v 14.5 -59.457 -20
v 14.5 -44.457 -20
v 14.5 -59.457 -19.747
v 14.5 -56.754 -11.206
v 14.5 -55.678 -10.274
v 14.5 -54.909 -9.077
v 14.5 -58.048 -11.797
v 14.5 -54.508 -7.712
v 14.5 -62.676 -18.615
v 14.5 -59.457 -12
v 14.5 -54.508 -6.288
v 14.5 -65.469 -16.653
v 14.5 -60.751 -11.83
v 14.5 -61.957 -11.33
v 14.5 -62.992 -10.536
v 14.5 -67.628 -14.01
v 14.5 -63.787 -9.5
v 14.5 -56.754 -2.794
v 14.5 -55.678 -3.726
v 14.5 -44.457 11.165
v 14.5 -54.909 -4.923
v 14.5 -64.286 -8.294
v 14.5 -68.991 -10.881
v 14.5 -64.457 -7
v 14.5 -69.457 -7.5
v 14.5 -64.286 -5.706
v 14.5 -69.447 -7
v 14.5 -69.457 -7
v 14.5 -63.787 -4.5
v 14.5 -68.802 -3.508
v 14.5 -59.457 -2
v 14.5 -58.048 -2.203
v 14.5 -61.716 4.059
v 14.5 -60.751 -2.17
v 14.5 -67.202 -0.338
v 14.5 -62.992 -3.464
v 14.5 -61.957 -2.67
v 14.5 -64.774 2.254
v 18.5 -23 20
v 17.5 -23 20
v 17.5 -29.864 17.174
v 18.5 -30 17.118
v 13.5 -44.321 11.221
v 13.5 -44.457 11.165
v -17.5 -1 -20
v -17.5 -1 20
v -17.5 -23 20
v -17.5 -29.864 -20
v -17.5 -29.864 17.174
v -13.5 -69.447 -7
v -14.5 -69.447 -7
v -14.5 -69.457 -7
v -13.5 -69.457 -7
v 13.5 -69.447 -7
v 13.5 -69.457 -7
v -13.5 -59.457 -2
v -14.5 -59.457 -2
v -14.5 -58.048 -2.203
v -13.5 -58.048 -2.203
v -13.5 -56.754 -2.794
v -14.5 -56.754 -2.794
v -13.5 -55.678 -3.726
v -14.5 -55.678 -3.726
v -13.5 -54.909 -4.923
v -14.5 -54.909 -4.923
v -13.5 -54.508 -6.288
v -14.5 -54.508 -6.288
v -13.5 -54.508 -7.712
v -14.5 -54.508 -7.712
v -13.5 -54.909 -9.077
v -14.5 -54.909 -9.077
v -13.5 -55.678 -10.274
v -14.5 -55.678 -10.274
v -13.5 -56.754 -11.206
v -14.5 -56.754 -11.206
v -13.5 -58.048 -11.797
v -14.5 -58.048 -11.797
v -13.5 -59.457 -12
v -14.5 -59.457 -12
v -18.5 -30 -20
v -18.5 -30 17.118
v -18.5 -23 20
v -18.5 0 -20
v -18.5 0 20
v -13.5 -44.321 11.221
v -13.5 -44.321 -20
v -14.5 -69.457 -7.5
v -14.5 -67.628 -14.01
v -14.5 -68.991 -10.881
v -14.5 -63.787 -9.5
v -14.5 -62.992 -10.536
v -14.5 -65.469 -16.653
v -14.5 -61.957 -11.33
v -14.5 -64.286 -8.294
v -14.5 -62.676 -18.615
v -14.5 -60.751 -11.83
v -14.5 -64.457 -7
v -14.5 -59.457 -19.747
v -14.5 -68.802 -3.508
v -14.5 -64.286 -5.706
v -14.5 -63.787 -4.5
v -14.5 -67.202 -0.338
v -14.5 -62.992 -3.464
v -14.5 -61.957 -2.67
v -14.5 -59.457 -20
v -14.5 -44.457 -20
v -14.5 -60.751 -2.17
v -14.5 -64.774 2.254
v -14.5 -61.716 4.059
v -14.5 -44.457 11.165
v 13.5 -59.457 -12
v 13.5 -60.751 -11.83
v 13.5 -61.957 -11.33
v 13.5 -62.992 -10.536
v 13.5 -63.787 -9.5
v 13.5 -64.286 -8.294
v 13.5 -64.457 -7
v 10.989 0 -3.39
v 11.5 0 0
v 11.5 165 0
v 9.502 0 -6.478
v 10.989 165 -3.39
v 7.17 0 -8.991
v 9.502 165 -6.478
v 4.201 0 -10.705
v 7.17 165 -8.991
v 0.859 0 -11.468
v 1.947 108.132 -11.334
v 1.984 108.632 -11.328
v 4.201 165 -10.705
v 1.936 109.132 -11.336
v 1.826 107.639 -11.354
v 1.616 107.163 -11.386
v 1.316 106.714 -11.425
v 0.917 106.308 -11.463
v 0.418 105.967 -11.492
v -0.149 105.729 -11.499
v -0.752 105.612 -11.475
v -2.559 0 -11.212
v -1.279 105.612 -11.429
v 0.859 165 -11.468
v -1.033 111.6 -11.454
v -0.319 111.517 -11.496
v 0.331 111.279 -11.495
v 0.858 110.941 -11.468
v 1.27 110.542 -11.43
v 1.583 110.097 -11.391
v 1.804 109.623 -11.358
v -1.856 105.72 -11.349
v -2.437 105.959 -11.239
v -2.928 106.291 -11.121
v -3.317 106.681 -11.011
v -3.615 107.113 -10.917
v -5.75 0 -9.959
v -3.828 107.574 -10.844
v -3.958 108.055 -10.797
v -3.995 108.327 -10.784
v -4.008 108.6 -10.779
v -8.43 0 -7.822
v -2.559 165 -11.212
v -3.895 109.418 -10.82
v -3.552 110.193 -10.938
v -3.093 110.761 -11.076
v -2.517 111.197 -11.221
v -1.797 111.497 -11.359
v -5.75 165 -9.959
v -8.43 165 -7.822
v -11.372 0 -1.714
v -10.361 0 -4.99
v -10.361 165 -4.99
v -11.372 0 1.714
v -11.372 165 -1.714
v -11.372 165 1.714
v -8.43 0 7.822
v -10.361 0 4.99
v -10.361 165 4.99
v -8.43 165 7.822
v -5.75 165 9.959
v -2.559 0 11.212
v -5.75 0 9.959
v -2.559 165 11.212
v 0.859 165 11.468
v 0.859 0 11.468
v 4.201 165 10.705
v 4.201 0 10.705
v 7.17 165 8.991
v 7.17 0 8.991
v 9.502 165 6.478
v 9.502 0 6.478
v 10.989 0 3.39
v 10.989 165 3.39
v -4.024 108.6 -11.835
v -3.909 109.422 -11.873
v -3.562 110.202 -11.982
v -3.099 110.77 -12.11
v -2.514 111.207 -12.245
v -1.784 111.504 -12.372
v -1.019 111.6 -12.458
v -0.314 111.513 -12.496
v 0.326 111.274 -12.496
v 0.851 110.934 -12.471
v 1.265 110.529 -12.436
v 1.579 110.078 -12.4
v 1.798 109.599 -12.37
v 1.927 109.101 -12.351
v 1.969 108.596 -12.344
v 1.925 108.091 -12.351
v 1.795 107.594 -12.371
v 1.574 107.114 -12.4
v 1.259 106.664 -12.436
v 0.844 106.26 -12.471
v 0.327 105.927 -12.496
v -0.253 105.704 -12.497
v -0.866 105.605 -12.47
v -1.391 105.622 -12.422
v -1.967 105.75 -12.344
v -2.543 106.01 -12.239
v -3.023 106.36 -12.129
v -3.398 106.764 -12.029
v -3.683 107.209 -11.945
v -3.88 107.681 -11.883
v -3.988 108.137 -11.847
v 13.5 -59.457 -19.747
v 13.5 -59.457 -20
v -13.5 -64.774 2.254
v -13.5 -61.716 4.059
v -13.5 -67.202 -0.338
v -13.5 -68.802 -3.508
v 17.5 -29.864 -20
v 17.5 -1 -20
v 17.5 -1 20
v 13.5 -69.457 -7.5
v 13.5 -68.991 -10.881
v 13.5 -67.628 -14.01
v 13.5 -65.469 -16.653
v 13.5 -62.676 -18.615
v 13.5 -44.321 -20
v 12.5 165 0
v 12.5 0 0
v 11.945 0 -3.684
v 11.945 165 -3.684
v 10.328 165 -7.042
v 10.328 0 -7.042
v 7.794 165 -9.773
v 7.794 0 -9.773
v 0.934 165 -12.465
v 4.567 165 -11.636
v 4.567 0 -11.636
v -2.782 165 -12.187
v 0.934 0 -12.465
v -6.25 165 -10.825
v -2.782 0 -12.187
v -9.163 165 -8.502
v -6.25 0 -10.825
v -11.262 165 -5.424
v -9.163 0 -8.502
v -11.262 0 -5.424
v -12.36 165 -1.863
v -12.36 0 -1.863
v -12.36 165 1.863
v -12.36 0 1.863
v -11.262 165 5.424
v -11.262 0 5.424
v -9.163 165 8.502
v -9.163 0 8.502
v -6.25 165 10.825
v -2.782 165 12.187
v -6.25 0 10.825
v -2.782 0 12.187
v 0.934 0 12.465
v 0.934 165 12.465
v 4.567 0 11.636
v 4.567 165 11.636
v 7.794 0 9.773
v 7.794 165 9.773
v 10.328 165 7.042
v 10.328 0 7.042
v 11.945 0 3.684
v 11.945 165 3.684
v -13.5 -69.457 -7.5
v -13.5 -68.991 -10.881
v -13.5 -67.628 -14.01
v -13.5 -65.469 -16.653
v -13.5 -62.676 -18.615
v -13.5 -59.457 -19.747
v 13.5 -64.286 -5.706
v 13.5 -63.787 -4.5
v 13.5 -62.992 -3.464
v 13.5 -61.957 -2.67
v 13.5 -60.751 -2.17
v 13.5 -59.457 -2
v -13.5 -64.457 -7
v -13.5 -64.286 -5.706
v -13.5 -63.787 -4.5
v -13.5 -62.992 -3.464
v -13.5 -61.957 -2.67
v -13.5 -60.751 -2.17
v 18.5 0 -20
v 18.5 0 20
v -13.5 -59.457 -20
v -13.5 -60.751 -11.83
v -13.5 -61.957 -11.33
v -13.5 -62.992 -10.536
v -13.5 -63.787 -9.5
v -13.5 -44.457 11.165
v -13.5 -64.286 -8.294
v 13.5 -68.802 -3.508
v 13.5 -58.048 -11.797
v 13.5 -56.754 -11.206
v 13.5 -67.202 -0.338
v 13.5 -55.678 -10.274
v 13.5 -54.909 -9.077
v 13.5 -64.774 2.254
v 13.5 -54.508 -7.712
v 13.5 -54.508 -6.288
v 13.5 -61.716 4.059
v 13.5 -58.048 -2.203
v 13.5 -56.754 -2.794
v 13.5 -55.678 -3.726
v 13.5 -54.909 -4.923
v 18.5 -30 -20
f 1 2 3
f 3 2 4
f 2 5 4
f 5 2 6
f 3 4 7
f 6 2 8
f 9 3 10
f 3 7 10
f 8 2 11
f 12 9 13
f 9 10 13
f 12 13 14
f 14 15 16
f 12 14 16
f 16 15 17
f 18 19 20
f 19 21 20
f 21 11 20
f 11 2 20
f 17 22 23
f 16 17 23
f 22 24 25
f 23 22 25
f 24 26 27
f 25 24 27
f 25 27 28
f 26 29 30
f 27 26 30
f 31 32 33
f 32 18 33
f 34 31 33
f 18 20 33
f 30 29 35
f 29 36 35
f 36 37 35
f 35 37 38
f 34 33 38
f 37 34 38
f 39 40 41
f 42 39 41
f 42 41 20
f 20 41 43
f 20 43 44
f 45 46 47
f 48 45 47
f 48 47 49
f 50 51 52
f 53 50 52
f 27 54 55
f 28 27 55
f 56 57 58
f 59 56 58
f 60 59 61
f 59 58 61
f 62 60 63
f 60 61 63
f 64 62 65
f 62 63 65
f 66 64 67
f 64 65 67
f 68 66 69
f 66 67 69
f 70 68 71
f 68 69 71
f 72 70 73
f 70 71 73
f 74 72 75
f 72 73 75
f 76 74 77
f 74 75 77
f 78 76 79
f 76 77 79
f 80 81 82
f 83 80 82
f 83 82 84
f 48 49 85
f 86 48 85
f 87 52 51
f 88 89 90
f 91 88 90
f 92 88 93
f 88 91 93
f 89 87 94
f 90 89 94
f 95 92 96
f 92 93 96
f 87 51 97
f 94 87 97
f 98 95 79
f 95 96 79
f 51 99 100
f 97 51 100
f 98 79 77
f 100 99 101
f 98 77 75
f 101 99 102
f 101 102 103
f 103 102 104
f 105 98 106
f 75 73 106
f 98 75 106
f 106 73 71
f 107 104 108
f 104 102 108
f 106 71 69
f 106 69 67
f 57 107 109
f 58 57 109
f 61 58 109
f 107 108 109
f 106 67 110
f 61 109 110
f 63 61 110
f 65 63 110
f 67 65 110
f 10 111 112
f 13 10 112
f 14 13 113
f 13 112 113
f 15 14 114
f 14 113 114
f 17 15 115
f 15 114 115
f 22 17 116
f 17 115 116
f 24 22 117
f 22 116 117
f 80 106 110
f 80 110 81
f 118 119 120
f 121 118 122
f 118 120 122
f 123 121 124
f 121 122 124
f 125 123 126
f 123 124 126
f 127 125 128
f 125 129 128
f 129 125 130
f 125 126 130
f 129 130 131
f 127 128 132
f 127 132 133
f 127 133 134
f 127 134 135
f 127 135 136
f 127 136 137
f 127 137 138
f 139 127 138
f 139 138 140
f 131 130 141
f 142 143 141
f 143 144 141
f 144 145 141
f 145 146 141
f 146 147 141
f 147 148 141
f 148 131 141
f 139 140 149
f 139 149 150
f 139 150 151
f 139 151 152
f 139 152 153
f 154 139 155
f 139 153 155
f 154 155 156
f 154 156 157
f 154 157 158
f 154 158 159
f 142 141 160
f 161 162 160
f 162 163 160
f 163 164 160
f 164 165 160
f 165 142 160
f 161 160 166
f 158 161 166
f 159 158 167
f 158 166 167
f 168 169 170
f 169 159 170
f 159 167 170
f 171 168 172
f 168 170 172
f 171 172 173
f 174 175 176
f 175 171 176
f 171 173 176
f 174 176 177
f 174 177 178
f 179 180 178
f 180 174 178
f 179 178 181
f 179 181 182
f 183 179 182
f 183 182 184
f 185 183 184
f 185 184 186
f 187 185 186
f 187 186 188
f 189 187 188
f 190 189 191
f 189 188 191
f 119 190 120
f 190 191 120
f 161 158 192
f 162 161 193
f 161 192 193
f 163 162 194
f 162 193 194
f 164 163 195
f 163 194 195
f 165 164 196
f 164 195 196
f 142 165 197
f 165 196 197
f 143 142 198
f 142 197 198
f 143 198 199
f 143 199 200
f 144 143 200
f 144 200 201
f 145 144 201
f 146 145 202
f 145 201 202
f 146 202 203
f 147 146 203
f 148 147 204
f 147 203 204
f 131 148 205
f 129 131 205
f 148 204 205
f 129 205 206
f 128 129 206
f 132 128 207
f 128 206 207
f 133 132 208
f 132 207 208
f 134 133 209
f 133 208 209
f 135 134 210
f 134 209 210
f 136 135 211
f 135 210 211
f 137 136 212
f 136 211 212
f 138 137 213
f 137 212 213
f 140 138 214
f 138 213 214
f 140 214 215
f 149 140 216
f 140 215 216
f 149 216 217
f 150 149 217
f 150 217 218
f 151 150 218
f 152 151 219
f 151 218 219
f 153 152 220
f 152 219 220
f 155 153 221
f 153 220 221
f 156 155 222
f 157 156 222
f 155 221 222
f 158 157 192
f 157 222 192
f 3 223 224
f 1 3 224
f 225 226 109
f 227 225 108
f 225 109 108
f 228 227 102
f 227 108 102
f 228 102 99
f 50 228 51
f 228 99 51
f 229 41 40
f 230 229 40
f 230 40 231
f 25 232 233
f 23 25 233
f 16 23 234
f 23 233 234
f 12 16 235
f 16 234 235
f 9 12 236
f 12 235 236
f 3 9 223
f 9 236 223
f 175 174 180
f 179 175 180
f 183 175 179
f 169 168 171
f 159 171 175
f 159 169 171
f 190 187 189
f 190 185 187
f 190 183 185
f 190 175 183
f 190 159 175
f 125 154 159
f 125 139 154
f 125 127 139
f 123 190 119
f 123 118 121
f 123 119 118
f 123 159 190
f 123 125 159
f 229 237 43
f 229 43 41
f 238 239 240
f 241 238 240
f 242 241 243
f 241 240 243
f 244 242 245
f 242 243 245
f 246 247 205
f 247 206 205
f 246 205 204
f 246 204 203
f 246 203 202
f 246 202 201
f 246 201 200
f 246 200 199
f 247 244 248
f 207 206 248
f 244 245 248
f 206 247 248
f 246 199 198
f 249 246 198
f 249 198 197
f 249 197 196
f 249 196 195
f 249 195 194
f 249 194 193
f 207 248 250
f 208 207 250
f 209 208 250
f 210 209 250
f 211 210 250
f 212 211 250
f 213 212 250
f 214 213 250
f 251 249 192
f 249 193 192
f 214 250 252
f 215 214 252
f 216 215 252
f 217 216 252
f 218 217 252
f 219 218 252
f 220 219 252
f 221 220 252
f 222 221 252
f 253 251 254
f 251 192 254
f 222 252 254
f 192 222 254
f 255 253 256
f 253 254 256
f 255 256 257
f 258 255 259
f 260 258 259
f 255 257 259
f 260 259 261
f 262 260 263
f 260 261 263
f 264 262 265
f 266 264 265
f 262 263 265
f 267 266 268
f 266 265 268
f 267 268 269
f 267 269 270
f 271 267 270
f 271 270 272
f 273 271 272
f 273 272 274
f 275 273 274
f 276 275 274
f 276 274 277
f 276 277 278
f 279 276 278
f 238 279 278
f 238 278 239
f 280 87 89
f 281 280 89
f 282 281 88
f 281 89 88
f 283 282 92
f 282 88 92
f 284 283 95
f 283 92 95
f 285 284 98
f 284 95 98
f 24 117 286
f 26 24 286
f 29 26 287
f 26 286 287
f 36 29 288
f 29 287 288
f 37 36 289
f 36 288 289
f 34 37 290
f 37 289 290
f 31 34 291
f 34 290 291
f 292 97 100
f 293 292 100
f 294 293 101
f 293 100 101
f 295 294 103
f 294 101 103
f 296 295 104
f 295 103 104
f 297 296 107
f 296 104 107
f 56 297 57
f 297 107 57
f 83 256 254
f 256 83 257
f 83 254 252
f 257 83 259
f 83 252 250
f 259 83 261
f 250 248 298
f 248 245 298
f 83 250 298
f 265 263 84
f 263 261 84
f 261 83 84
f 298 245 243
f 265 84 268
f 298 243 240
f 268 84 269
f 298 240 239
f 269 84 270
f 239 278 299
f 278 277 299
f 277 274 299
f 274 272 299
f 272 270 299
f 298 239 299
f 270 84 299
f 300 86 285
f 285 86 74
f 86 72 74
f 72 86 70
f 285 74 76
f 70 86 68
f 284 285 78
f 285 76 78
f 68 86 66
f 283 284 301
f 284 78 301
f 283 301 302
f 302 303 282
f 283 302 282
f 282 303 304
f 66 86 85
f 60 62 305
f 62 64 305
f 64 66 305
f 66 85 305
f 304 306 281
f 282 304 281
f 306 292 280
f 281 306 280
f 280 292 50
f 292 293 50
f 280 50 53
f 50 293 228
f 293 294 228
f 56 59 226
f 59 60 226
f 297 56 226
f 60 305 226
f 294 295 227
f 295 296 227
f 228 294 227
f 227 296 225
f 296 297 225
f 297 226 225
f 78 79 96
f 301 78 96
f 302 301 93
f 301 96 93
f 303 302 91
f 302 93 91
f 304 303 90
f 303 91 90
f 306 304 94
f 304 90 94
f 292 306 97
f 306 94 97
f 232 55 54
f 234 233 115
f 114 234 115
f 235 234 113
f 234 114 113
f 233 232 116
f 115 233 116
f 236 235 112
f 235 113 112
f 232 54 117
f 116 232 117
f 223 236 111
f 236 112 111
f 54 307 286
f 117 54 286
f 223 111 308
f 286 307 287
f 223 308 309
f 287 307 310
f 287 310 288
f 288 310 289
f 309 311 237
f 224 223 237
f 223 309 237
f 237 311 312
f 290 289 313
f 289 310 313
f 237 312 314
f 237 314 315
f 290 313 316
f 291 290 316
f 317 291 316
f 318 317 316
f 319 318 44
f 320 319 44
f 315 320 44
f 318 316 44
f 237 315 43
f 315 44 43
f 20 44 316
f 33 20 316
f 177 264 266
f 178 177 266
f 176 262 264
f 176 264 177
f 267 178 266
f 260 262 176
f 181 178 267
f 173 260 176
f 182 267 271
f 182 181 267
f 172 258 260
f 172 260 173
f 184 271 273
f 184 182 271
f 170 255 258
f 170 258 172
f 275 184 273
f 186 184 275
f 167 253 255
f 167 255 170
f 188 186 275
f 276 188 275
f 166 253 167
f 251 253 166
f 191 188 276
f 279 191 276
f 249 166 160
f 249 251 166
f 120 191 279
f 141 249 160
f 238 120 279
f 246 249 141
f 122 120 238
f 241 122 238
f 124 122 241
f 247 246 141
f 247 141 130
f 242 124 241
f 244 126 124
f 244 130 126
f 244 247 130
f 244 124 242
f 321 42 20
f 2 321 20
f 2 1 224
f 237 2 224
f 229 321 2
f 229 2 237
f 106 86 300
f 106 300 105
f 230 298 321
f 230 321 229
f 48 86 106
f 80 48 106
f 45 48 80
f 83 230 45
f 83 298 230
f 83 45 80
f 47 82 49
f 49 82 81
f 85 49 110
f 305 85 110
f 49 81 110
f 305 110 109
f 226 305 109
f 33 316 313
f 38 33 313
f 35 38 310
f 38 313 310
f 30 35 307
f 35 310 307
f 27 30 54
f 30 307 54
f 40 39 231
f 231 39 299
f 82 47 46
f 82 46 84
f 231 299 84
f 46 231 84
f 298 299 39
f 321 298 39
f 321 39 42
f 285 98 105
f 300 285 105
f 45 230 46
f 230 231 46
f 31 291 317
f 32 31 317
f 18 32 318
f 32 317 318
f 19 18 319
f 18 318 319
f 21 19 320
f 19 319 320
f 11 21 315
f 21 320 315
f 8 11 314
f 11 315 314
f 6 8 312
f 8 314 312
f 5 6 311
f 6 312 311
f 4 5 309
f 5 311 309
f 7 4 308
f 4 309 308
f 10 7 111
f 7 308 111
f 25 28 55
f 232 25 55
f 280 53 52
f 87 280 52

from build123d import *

# Parameters (mm, degrees)
CROQUIS1_R                 = 12.5
SALIENTE_EXTRUIR1_DEPTH    = 165
CROQUIS2_R                 = 11.5
CORTAR_EXTRUIR1_DEPTH      = 166
EXTRUIR_L_MINA1_DEPTH      = 20
CORTAR_EXTRUIR4_DEPTH      = 5
CORTAR_EXTRUIR4_DEPTH_BACK = 34
CROQUIS6_R                 = 2.999725426
CORTAR_EXTRUIR5_DEPTH      = 5


with BuildPart() as part:
    # Croquis1 → Saliente-Extruir1 (new body)
    with BuildSketch(Plane(origin=(0, 0, 0), x_dir=(1, 0, 0), z_dir=(0, 1, 0))):
        Circle(CROQUIS1_R)
    extrude(amount=SALIENTE_EXTRUIR1_DEPTH)

    # Croquis2 → Cortar-Extruir1 (cut, through all)
    with BuildSketch(Plane(origin=(0, 165, 0), x_dir=(1, 0, 0), z_dir=(0, 1, 0))):
        Circle(CROQUIS2_R)
    extrude(amount=-CORTAR_EXTRUIR1_DEPTH, mode=Mode.SUBTRACT)

    # Croquis4 → Extruir-Lámina1 (add)
    with BuildSketch(Plane.XY):
        Polygon((-14.5, -69.456832295), (-14.5, -44.456832295), (-18.5, -30), (-18.5, 0), (18.5, 0), (18.5, -30), (14.5, -44.456832295), (14.5, -69.456832295), (13.5, -69.456832295), (13.5, -44.321040369), (17.5, -29.864208074), (17.5, -1), (-17.5, -1), (-17.5, -29.864208074), (-13.5, -44.321040369), (-13.5, -69.456832295), align=None)
    extruir_l_mina1 = extrude(amount=EXTRUIR_L_MINA1_DEPTH)

    # Simetría1: Extruir-Lámina1 across plane
    add(extruir_l_mina1.mirror(Plane.XY))

    # Croquis5 → Cortar-Extruir4 (cut, two sides)
    with BuildSketch(Plane.ZY.offset(14.5)) as cortar_extruir4_sk:
        Polygon((20, -23), (11.165079241, -44.456832295), (20, -44.456832295), align=None)
        with BuildLine():
            Line((20, -44.456832295), (11.165079241, -44.456832295))
            Line((11.165079241, -44.456832295), (4.058522787, -61.716091794))
            ThreePointArc((4.058522787, -61.716091794), (-0.338082334, -67.201681505), (-7, -69.446828292))
            Line((-7, -69.446828292), (-7, -69.456832295))
            Line((-7, -69.456832295), (20, -69.456832295))
            Line((20, -69.456832295), (20, -44.456832295))
        make_face()
        with BuildLine():
            Line((-19.747448714, -59.456832295), (-20, -59.456832295))
            Line((-20, -59.456832295), (-20, -69.456832295))
            Line((-20, -69.456832295), (-7.500000063, -69.456832295))
            ThreePointArc((-7.500000063, -69.456832295), (-15.405694175, -66.63929064), (-19.747448714, -59.456832295))
        make_face()
        with BuildLine():
            ThreePointArc((-2, -59.456832295), (-7, -54.456832295), (-12, -59.456832295))
            Line((-12, -59.456832295), (-7, -59.456832295))
            Line((-7, -59.456832295), (-7, -64.456832295))
            ThreePointArc((-7, -64.456832295), (-3.464466094, -62.992366201), (-2, -59.456832295))
        make_face()
        with BuildLine():
            Line((-7, -59.456832295), (-12, -59.456832295))
            ThreePointArc((-12, -59.456832295), (-10.535533906, -62.992366201), (-7, -64.456832295))
            Line((-7, -64.456832295), (-7, -59.456832295))
        make_face()
    extrude(amount=CORTAR_EXTRUIR4_DEPTH, mode=Mode.SUBTRACT)
    extrude(cortar_extruir4_sk.sketch, amount=-CORTAR_EXTRUIR4_DEPTH_BACK, mode=Mode.SUBTRACT)

    # Croquis6 → Cortar-Extruir5 (cut, symmetric)
    with BuildSketch(Plane(origin=(-0.184914892, 0, -12.485243343), x_dir=(-0.99989034, 0, 0.014809052), z_dir=(-0.014809052, 0, -0.99989034))):
        with Locations((0.848128323, 108.600309026)):
            Circle(CROQUIS6_R)
    extrude(amount=CORTAR_EXTRUIR5_DEPTH, both=True, mode=Mode.SUBTRACT)


solid = part.part
